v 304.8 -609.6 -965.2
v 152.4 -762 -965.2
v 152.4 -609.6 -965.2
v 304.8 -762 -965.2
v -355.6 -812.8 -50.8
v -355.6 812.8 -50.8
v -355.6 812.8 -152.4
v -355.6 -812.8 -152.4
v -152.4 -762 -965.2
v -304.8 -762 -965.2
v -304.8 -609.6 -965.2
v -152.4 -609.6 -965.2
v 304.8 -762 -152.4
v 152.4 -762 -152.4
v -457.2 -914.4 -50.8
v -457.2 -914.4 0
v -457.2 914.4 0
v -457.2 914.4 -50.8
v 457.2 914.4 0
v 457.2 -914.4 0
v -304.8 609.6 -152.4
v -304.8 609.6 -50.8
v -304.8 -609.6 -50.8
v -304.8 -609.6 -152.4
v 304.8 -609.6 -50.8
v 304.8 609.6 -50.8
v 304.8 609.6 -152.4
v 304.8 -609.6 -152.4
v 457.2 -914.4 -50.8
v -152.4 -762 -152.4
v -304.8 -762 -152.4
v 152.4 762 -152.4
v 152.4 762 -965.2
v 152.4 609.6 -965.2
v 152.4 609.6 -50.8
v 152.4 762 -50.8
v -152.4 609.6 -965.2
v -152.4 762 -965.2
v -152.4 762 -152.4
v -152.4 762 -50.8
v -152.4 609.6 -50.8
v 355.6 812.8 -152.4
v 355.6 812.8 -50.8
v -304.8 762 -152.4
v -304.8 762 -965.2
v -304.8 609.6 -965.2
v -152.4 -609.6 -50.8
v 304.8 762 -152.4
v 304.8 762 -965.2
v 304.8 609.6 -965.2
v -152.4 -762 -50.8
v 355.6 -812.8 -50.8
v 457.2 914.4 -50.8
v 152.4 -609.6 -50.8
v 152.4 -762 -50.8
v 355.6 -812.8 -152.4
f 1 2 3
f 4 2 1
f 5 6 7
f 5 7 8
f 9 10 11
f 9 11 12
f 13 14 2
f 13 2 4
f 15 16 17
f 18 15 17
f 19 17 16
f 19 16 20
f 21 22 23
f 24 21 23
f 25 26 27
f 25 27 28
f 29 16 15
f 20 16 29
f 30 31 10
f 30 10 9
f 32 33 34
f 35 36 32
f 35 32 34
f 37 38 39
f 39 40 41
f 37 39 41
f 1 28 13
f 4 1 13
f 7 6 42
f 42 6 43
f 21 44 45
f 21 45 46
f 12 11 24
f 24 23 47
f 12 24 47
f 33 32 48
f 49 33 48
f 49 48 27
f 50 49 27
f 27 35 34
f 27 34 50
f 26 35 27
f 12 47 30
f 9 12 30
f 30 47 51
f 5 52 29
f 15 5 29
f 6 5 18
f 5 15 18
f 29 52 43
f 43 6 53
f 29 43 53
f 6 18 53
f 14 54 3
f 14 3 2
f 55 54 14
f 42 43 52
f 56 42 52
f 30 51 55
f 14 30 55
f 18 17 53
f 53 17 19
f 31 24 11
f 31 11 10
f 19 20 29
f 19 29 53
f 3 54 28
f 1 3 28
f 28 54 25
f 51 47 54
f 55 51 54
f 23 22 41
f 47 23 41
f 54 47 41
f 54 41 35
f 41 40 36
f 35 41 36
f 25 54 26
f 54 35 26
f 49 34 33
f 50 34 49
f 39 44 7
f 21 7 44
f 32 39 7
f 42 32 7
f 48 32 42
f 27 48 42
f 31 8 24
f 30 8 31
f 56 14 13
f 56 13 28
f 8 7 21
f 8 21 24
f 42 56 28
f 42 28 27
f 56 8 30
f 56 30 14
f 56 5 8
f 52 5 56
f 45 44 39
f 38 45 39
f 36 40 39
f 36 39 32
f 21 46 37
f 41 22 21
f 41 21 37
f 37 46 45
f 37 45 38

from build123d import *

# Parameters (mm, degrees)
F0_W     = 914.4
F0_H     = 1828.8
F1_DEPTH = 50.8
F2_W     = 711.2
F2_H     = 1625.6
F2_W_2   = 609.6
F2_H_2   = 1524
F3_DEPTH = 101.6
F5_W     = 152.4
F5_H     = 152.4
F4_DEPTH = 914.4


with BuildPart() as f1:
    # F0 (on Top) → F1 (new body)
    with BuildSketch(Plane.XY):
        Rectangle(F0_W, F0_H)
    extrude(amount=-F1_DEPTH)

    # F2 (on face) → F3 (join)
    with BuildSketch(Plane(origin=(0, 0, -50.8), x_dir=(1, 0, 0), z_dir=(0, 0, -1))):
        Rectangle(F2_W, F2_H)
        Rectangle(F2_W_2, F2_H_2, mode=Mode.SUBTRACT)
    extrude(amount=F3_DEPTH)

    # F5 (on face) → F4 (join)
    with BuildSketch(Plane(origin=(0, 0, -50.8), x_dir=(1, 0, 0), z_dir=(0, 0, -1))):
        with Locations((-228.6, -685.8)):
            Rectangle(F5_W, F5_H)
        with Locations((-228.6, 685.8)):
            Rectangle(F5_W, F5_H)
        with Locations((228.6, -685.8)):
            Rectangle(F5_W, F5_H)
        with Locations((228.6, 685.8)):
            Rectangle(F5_W, F5_H)
    extrude(amount=F4_DEPTH)


solid = f1.part
